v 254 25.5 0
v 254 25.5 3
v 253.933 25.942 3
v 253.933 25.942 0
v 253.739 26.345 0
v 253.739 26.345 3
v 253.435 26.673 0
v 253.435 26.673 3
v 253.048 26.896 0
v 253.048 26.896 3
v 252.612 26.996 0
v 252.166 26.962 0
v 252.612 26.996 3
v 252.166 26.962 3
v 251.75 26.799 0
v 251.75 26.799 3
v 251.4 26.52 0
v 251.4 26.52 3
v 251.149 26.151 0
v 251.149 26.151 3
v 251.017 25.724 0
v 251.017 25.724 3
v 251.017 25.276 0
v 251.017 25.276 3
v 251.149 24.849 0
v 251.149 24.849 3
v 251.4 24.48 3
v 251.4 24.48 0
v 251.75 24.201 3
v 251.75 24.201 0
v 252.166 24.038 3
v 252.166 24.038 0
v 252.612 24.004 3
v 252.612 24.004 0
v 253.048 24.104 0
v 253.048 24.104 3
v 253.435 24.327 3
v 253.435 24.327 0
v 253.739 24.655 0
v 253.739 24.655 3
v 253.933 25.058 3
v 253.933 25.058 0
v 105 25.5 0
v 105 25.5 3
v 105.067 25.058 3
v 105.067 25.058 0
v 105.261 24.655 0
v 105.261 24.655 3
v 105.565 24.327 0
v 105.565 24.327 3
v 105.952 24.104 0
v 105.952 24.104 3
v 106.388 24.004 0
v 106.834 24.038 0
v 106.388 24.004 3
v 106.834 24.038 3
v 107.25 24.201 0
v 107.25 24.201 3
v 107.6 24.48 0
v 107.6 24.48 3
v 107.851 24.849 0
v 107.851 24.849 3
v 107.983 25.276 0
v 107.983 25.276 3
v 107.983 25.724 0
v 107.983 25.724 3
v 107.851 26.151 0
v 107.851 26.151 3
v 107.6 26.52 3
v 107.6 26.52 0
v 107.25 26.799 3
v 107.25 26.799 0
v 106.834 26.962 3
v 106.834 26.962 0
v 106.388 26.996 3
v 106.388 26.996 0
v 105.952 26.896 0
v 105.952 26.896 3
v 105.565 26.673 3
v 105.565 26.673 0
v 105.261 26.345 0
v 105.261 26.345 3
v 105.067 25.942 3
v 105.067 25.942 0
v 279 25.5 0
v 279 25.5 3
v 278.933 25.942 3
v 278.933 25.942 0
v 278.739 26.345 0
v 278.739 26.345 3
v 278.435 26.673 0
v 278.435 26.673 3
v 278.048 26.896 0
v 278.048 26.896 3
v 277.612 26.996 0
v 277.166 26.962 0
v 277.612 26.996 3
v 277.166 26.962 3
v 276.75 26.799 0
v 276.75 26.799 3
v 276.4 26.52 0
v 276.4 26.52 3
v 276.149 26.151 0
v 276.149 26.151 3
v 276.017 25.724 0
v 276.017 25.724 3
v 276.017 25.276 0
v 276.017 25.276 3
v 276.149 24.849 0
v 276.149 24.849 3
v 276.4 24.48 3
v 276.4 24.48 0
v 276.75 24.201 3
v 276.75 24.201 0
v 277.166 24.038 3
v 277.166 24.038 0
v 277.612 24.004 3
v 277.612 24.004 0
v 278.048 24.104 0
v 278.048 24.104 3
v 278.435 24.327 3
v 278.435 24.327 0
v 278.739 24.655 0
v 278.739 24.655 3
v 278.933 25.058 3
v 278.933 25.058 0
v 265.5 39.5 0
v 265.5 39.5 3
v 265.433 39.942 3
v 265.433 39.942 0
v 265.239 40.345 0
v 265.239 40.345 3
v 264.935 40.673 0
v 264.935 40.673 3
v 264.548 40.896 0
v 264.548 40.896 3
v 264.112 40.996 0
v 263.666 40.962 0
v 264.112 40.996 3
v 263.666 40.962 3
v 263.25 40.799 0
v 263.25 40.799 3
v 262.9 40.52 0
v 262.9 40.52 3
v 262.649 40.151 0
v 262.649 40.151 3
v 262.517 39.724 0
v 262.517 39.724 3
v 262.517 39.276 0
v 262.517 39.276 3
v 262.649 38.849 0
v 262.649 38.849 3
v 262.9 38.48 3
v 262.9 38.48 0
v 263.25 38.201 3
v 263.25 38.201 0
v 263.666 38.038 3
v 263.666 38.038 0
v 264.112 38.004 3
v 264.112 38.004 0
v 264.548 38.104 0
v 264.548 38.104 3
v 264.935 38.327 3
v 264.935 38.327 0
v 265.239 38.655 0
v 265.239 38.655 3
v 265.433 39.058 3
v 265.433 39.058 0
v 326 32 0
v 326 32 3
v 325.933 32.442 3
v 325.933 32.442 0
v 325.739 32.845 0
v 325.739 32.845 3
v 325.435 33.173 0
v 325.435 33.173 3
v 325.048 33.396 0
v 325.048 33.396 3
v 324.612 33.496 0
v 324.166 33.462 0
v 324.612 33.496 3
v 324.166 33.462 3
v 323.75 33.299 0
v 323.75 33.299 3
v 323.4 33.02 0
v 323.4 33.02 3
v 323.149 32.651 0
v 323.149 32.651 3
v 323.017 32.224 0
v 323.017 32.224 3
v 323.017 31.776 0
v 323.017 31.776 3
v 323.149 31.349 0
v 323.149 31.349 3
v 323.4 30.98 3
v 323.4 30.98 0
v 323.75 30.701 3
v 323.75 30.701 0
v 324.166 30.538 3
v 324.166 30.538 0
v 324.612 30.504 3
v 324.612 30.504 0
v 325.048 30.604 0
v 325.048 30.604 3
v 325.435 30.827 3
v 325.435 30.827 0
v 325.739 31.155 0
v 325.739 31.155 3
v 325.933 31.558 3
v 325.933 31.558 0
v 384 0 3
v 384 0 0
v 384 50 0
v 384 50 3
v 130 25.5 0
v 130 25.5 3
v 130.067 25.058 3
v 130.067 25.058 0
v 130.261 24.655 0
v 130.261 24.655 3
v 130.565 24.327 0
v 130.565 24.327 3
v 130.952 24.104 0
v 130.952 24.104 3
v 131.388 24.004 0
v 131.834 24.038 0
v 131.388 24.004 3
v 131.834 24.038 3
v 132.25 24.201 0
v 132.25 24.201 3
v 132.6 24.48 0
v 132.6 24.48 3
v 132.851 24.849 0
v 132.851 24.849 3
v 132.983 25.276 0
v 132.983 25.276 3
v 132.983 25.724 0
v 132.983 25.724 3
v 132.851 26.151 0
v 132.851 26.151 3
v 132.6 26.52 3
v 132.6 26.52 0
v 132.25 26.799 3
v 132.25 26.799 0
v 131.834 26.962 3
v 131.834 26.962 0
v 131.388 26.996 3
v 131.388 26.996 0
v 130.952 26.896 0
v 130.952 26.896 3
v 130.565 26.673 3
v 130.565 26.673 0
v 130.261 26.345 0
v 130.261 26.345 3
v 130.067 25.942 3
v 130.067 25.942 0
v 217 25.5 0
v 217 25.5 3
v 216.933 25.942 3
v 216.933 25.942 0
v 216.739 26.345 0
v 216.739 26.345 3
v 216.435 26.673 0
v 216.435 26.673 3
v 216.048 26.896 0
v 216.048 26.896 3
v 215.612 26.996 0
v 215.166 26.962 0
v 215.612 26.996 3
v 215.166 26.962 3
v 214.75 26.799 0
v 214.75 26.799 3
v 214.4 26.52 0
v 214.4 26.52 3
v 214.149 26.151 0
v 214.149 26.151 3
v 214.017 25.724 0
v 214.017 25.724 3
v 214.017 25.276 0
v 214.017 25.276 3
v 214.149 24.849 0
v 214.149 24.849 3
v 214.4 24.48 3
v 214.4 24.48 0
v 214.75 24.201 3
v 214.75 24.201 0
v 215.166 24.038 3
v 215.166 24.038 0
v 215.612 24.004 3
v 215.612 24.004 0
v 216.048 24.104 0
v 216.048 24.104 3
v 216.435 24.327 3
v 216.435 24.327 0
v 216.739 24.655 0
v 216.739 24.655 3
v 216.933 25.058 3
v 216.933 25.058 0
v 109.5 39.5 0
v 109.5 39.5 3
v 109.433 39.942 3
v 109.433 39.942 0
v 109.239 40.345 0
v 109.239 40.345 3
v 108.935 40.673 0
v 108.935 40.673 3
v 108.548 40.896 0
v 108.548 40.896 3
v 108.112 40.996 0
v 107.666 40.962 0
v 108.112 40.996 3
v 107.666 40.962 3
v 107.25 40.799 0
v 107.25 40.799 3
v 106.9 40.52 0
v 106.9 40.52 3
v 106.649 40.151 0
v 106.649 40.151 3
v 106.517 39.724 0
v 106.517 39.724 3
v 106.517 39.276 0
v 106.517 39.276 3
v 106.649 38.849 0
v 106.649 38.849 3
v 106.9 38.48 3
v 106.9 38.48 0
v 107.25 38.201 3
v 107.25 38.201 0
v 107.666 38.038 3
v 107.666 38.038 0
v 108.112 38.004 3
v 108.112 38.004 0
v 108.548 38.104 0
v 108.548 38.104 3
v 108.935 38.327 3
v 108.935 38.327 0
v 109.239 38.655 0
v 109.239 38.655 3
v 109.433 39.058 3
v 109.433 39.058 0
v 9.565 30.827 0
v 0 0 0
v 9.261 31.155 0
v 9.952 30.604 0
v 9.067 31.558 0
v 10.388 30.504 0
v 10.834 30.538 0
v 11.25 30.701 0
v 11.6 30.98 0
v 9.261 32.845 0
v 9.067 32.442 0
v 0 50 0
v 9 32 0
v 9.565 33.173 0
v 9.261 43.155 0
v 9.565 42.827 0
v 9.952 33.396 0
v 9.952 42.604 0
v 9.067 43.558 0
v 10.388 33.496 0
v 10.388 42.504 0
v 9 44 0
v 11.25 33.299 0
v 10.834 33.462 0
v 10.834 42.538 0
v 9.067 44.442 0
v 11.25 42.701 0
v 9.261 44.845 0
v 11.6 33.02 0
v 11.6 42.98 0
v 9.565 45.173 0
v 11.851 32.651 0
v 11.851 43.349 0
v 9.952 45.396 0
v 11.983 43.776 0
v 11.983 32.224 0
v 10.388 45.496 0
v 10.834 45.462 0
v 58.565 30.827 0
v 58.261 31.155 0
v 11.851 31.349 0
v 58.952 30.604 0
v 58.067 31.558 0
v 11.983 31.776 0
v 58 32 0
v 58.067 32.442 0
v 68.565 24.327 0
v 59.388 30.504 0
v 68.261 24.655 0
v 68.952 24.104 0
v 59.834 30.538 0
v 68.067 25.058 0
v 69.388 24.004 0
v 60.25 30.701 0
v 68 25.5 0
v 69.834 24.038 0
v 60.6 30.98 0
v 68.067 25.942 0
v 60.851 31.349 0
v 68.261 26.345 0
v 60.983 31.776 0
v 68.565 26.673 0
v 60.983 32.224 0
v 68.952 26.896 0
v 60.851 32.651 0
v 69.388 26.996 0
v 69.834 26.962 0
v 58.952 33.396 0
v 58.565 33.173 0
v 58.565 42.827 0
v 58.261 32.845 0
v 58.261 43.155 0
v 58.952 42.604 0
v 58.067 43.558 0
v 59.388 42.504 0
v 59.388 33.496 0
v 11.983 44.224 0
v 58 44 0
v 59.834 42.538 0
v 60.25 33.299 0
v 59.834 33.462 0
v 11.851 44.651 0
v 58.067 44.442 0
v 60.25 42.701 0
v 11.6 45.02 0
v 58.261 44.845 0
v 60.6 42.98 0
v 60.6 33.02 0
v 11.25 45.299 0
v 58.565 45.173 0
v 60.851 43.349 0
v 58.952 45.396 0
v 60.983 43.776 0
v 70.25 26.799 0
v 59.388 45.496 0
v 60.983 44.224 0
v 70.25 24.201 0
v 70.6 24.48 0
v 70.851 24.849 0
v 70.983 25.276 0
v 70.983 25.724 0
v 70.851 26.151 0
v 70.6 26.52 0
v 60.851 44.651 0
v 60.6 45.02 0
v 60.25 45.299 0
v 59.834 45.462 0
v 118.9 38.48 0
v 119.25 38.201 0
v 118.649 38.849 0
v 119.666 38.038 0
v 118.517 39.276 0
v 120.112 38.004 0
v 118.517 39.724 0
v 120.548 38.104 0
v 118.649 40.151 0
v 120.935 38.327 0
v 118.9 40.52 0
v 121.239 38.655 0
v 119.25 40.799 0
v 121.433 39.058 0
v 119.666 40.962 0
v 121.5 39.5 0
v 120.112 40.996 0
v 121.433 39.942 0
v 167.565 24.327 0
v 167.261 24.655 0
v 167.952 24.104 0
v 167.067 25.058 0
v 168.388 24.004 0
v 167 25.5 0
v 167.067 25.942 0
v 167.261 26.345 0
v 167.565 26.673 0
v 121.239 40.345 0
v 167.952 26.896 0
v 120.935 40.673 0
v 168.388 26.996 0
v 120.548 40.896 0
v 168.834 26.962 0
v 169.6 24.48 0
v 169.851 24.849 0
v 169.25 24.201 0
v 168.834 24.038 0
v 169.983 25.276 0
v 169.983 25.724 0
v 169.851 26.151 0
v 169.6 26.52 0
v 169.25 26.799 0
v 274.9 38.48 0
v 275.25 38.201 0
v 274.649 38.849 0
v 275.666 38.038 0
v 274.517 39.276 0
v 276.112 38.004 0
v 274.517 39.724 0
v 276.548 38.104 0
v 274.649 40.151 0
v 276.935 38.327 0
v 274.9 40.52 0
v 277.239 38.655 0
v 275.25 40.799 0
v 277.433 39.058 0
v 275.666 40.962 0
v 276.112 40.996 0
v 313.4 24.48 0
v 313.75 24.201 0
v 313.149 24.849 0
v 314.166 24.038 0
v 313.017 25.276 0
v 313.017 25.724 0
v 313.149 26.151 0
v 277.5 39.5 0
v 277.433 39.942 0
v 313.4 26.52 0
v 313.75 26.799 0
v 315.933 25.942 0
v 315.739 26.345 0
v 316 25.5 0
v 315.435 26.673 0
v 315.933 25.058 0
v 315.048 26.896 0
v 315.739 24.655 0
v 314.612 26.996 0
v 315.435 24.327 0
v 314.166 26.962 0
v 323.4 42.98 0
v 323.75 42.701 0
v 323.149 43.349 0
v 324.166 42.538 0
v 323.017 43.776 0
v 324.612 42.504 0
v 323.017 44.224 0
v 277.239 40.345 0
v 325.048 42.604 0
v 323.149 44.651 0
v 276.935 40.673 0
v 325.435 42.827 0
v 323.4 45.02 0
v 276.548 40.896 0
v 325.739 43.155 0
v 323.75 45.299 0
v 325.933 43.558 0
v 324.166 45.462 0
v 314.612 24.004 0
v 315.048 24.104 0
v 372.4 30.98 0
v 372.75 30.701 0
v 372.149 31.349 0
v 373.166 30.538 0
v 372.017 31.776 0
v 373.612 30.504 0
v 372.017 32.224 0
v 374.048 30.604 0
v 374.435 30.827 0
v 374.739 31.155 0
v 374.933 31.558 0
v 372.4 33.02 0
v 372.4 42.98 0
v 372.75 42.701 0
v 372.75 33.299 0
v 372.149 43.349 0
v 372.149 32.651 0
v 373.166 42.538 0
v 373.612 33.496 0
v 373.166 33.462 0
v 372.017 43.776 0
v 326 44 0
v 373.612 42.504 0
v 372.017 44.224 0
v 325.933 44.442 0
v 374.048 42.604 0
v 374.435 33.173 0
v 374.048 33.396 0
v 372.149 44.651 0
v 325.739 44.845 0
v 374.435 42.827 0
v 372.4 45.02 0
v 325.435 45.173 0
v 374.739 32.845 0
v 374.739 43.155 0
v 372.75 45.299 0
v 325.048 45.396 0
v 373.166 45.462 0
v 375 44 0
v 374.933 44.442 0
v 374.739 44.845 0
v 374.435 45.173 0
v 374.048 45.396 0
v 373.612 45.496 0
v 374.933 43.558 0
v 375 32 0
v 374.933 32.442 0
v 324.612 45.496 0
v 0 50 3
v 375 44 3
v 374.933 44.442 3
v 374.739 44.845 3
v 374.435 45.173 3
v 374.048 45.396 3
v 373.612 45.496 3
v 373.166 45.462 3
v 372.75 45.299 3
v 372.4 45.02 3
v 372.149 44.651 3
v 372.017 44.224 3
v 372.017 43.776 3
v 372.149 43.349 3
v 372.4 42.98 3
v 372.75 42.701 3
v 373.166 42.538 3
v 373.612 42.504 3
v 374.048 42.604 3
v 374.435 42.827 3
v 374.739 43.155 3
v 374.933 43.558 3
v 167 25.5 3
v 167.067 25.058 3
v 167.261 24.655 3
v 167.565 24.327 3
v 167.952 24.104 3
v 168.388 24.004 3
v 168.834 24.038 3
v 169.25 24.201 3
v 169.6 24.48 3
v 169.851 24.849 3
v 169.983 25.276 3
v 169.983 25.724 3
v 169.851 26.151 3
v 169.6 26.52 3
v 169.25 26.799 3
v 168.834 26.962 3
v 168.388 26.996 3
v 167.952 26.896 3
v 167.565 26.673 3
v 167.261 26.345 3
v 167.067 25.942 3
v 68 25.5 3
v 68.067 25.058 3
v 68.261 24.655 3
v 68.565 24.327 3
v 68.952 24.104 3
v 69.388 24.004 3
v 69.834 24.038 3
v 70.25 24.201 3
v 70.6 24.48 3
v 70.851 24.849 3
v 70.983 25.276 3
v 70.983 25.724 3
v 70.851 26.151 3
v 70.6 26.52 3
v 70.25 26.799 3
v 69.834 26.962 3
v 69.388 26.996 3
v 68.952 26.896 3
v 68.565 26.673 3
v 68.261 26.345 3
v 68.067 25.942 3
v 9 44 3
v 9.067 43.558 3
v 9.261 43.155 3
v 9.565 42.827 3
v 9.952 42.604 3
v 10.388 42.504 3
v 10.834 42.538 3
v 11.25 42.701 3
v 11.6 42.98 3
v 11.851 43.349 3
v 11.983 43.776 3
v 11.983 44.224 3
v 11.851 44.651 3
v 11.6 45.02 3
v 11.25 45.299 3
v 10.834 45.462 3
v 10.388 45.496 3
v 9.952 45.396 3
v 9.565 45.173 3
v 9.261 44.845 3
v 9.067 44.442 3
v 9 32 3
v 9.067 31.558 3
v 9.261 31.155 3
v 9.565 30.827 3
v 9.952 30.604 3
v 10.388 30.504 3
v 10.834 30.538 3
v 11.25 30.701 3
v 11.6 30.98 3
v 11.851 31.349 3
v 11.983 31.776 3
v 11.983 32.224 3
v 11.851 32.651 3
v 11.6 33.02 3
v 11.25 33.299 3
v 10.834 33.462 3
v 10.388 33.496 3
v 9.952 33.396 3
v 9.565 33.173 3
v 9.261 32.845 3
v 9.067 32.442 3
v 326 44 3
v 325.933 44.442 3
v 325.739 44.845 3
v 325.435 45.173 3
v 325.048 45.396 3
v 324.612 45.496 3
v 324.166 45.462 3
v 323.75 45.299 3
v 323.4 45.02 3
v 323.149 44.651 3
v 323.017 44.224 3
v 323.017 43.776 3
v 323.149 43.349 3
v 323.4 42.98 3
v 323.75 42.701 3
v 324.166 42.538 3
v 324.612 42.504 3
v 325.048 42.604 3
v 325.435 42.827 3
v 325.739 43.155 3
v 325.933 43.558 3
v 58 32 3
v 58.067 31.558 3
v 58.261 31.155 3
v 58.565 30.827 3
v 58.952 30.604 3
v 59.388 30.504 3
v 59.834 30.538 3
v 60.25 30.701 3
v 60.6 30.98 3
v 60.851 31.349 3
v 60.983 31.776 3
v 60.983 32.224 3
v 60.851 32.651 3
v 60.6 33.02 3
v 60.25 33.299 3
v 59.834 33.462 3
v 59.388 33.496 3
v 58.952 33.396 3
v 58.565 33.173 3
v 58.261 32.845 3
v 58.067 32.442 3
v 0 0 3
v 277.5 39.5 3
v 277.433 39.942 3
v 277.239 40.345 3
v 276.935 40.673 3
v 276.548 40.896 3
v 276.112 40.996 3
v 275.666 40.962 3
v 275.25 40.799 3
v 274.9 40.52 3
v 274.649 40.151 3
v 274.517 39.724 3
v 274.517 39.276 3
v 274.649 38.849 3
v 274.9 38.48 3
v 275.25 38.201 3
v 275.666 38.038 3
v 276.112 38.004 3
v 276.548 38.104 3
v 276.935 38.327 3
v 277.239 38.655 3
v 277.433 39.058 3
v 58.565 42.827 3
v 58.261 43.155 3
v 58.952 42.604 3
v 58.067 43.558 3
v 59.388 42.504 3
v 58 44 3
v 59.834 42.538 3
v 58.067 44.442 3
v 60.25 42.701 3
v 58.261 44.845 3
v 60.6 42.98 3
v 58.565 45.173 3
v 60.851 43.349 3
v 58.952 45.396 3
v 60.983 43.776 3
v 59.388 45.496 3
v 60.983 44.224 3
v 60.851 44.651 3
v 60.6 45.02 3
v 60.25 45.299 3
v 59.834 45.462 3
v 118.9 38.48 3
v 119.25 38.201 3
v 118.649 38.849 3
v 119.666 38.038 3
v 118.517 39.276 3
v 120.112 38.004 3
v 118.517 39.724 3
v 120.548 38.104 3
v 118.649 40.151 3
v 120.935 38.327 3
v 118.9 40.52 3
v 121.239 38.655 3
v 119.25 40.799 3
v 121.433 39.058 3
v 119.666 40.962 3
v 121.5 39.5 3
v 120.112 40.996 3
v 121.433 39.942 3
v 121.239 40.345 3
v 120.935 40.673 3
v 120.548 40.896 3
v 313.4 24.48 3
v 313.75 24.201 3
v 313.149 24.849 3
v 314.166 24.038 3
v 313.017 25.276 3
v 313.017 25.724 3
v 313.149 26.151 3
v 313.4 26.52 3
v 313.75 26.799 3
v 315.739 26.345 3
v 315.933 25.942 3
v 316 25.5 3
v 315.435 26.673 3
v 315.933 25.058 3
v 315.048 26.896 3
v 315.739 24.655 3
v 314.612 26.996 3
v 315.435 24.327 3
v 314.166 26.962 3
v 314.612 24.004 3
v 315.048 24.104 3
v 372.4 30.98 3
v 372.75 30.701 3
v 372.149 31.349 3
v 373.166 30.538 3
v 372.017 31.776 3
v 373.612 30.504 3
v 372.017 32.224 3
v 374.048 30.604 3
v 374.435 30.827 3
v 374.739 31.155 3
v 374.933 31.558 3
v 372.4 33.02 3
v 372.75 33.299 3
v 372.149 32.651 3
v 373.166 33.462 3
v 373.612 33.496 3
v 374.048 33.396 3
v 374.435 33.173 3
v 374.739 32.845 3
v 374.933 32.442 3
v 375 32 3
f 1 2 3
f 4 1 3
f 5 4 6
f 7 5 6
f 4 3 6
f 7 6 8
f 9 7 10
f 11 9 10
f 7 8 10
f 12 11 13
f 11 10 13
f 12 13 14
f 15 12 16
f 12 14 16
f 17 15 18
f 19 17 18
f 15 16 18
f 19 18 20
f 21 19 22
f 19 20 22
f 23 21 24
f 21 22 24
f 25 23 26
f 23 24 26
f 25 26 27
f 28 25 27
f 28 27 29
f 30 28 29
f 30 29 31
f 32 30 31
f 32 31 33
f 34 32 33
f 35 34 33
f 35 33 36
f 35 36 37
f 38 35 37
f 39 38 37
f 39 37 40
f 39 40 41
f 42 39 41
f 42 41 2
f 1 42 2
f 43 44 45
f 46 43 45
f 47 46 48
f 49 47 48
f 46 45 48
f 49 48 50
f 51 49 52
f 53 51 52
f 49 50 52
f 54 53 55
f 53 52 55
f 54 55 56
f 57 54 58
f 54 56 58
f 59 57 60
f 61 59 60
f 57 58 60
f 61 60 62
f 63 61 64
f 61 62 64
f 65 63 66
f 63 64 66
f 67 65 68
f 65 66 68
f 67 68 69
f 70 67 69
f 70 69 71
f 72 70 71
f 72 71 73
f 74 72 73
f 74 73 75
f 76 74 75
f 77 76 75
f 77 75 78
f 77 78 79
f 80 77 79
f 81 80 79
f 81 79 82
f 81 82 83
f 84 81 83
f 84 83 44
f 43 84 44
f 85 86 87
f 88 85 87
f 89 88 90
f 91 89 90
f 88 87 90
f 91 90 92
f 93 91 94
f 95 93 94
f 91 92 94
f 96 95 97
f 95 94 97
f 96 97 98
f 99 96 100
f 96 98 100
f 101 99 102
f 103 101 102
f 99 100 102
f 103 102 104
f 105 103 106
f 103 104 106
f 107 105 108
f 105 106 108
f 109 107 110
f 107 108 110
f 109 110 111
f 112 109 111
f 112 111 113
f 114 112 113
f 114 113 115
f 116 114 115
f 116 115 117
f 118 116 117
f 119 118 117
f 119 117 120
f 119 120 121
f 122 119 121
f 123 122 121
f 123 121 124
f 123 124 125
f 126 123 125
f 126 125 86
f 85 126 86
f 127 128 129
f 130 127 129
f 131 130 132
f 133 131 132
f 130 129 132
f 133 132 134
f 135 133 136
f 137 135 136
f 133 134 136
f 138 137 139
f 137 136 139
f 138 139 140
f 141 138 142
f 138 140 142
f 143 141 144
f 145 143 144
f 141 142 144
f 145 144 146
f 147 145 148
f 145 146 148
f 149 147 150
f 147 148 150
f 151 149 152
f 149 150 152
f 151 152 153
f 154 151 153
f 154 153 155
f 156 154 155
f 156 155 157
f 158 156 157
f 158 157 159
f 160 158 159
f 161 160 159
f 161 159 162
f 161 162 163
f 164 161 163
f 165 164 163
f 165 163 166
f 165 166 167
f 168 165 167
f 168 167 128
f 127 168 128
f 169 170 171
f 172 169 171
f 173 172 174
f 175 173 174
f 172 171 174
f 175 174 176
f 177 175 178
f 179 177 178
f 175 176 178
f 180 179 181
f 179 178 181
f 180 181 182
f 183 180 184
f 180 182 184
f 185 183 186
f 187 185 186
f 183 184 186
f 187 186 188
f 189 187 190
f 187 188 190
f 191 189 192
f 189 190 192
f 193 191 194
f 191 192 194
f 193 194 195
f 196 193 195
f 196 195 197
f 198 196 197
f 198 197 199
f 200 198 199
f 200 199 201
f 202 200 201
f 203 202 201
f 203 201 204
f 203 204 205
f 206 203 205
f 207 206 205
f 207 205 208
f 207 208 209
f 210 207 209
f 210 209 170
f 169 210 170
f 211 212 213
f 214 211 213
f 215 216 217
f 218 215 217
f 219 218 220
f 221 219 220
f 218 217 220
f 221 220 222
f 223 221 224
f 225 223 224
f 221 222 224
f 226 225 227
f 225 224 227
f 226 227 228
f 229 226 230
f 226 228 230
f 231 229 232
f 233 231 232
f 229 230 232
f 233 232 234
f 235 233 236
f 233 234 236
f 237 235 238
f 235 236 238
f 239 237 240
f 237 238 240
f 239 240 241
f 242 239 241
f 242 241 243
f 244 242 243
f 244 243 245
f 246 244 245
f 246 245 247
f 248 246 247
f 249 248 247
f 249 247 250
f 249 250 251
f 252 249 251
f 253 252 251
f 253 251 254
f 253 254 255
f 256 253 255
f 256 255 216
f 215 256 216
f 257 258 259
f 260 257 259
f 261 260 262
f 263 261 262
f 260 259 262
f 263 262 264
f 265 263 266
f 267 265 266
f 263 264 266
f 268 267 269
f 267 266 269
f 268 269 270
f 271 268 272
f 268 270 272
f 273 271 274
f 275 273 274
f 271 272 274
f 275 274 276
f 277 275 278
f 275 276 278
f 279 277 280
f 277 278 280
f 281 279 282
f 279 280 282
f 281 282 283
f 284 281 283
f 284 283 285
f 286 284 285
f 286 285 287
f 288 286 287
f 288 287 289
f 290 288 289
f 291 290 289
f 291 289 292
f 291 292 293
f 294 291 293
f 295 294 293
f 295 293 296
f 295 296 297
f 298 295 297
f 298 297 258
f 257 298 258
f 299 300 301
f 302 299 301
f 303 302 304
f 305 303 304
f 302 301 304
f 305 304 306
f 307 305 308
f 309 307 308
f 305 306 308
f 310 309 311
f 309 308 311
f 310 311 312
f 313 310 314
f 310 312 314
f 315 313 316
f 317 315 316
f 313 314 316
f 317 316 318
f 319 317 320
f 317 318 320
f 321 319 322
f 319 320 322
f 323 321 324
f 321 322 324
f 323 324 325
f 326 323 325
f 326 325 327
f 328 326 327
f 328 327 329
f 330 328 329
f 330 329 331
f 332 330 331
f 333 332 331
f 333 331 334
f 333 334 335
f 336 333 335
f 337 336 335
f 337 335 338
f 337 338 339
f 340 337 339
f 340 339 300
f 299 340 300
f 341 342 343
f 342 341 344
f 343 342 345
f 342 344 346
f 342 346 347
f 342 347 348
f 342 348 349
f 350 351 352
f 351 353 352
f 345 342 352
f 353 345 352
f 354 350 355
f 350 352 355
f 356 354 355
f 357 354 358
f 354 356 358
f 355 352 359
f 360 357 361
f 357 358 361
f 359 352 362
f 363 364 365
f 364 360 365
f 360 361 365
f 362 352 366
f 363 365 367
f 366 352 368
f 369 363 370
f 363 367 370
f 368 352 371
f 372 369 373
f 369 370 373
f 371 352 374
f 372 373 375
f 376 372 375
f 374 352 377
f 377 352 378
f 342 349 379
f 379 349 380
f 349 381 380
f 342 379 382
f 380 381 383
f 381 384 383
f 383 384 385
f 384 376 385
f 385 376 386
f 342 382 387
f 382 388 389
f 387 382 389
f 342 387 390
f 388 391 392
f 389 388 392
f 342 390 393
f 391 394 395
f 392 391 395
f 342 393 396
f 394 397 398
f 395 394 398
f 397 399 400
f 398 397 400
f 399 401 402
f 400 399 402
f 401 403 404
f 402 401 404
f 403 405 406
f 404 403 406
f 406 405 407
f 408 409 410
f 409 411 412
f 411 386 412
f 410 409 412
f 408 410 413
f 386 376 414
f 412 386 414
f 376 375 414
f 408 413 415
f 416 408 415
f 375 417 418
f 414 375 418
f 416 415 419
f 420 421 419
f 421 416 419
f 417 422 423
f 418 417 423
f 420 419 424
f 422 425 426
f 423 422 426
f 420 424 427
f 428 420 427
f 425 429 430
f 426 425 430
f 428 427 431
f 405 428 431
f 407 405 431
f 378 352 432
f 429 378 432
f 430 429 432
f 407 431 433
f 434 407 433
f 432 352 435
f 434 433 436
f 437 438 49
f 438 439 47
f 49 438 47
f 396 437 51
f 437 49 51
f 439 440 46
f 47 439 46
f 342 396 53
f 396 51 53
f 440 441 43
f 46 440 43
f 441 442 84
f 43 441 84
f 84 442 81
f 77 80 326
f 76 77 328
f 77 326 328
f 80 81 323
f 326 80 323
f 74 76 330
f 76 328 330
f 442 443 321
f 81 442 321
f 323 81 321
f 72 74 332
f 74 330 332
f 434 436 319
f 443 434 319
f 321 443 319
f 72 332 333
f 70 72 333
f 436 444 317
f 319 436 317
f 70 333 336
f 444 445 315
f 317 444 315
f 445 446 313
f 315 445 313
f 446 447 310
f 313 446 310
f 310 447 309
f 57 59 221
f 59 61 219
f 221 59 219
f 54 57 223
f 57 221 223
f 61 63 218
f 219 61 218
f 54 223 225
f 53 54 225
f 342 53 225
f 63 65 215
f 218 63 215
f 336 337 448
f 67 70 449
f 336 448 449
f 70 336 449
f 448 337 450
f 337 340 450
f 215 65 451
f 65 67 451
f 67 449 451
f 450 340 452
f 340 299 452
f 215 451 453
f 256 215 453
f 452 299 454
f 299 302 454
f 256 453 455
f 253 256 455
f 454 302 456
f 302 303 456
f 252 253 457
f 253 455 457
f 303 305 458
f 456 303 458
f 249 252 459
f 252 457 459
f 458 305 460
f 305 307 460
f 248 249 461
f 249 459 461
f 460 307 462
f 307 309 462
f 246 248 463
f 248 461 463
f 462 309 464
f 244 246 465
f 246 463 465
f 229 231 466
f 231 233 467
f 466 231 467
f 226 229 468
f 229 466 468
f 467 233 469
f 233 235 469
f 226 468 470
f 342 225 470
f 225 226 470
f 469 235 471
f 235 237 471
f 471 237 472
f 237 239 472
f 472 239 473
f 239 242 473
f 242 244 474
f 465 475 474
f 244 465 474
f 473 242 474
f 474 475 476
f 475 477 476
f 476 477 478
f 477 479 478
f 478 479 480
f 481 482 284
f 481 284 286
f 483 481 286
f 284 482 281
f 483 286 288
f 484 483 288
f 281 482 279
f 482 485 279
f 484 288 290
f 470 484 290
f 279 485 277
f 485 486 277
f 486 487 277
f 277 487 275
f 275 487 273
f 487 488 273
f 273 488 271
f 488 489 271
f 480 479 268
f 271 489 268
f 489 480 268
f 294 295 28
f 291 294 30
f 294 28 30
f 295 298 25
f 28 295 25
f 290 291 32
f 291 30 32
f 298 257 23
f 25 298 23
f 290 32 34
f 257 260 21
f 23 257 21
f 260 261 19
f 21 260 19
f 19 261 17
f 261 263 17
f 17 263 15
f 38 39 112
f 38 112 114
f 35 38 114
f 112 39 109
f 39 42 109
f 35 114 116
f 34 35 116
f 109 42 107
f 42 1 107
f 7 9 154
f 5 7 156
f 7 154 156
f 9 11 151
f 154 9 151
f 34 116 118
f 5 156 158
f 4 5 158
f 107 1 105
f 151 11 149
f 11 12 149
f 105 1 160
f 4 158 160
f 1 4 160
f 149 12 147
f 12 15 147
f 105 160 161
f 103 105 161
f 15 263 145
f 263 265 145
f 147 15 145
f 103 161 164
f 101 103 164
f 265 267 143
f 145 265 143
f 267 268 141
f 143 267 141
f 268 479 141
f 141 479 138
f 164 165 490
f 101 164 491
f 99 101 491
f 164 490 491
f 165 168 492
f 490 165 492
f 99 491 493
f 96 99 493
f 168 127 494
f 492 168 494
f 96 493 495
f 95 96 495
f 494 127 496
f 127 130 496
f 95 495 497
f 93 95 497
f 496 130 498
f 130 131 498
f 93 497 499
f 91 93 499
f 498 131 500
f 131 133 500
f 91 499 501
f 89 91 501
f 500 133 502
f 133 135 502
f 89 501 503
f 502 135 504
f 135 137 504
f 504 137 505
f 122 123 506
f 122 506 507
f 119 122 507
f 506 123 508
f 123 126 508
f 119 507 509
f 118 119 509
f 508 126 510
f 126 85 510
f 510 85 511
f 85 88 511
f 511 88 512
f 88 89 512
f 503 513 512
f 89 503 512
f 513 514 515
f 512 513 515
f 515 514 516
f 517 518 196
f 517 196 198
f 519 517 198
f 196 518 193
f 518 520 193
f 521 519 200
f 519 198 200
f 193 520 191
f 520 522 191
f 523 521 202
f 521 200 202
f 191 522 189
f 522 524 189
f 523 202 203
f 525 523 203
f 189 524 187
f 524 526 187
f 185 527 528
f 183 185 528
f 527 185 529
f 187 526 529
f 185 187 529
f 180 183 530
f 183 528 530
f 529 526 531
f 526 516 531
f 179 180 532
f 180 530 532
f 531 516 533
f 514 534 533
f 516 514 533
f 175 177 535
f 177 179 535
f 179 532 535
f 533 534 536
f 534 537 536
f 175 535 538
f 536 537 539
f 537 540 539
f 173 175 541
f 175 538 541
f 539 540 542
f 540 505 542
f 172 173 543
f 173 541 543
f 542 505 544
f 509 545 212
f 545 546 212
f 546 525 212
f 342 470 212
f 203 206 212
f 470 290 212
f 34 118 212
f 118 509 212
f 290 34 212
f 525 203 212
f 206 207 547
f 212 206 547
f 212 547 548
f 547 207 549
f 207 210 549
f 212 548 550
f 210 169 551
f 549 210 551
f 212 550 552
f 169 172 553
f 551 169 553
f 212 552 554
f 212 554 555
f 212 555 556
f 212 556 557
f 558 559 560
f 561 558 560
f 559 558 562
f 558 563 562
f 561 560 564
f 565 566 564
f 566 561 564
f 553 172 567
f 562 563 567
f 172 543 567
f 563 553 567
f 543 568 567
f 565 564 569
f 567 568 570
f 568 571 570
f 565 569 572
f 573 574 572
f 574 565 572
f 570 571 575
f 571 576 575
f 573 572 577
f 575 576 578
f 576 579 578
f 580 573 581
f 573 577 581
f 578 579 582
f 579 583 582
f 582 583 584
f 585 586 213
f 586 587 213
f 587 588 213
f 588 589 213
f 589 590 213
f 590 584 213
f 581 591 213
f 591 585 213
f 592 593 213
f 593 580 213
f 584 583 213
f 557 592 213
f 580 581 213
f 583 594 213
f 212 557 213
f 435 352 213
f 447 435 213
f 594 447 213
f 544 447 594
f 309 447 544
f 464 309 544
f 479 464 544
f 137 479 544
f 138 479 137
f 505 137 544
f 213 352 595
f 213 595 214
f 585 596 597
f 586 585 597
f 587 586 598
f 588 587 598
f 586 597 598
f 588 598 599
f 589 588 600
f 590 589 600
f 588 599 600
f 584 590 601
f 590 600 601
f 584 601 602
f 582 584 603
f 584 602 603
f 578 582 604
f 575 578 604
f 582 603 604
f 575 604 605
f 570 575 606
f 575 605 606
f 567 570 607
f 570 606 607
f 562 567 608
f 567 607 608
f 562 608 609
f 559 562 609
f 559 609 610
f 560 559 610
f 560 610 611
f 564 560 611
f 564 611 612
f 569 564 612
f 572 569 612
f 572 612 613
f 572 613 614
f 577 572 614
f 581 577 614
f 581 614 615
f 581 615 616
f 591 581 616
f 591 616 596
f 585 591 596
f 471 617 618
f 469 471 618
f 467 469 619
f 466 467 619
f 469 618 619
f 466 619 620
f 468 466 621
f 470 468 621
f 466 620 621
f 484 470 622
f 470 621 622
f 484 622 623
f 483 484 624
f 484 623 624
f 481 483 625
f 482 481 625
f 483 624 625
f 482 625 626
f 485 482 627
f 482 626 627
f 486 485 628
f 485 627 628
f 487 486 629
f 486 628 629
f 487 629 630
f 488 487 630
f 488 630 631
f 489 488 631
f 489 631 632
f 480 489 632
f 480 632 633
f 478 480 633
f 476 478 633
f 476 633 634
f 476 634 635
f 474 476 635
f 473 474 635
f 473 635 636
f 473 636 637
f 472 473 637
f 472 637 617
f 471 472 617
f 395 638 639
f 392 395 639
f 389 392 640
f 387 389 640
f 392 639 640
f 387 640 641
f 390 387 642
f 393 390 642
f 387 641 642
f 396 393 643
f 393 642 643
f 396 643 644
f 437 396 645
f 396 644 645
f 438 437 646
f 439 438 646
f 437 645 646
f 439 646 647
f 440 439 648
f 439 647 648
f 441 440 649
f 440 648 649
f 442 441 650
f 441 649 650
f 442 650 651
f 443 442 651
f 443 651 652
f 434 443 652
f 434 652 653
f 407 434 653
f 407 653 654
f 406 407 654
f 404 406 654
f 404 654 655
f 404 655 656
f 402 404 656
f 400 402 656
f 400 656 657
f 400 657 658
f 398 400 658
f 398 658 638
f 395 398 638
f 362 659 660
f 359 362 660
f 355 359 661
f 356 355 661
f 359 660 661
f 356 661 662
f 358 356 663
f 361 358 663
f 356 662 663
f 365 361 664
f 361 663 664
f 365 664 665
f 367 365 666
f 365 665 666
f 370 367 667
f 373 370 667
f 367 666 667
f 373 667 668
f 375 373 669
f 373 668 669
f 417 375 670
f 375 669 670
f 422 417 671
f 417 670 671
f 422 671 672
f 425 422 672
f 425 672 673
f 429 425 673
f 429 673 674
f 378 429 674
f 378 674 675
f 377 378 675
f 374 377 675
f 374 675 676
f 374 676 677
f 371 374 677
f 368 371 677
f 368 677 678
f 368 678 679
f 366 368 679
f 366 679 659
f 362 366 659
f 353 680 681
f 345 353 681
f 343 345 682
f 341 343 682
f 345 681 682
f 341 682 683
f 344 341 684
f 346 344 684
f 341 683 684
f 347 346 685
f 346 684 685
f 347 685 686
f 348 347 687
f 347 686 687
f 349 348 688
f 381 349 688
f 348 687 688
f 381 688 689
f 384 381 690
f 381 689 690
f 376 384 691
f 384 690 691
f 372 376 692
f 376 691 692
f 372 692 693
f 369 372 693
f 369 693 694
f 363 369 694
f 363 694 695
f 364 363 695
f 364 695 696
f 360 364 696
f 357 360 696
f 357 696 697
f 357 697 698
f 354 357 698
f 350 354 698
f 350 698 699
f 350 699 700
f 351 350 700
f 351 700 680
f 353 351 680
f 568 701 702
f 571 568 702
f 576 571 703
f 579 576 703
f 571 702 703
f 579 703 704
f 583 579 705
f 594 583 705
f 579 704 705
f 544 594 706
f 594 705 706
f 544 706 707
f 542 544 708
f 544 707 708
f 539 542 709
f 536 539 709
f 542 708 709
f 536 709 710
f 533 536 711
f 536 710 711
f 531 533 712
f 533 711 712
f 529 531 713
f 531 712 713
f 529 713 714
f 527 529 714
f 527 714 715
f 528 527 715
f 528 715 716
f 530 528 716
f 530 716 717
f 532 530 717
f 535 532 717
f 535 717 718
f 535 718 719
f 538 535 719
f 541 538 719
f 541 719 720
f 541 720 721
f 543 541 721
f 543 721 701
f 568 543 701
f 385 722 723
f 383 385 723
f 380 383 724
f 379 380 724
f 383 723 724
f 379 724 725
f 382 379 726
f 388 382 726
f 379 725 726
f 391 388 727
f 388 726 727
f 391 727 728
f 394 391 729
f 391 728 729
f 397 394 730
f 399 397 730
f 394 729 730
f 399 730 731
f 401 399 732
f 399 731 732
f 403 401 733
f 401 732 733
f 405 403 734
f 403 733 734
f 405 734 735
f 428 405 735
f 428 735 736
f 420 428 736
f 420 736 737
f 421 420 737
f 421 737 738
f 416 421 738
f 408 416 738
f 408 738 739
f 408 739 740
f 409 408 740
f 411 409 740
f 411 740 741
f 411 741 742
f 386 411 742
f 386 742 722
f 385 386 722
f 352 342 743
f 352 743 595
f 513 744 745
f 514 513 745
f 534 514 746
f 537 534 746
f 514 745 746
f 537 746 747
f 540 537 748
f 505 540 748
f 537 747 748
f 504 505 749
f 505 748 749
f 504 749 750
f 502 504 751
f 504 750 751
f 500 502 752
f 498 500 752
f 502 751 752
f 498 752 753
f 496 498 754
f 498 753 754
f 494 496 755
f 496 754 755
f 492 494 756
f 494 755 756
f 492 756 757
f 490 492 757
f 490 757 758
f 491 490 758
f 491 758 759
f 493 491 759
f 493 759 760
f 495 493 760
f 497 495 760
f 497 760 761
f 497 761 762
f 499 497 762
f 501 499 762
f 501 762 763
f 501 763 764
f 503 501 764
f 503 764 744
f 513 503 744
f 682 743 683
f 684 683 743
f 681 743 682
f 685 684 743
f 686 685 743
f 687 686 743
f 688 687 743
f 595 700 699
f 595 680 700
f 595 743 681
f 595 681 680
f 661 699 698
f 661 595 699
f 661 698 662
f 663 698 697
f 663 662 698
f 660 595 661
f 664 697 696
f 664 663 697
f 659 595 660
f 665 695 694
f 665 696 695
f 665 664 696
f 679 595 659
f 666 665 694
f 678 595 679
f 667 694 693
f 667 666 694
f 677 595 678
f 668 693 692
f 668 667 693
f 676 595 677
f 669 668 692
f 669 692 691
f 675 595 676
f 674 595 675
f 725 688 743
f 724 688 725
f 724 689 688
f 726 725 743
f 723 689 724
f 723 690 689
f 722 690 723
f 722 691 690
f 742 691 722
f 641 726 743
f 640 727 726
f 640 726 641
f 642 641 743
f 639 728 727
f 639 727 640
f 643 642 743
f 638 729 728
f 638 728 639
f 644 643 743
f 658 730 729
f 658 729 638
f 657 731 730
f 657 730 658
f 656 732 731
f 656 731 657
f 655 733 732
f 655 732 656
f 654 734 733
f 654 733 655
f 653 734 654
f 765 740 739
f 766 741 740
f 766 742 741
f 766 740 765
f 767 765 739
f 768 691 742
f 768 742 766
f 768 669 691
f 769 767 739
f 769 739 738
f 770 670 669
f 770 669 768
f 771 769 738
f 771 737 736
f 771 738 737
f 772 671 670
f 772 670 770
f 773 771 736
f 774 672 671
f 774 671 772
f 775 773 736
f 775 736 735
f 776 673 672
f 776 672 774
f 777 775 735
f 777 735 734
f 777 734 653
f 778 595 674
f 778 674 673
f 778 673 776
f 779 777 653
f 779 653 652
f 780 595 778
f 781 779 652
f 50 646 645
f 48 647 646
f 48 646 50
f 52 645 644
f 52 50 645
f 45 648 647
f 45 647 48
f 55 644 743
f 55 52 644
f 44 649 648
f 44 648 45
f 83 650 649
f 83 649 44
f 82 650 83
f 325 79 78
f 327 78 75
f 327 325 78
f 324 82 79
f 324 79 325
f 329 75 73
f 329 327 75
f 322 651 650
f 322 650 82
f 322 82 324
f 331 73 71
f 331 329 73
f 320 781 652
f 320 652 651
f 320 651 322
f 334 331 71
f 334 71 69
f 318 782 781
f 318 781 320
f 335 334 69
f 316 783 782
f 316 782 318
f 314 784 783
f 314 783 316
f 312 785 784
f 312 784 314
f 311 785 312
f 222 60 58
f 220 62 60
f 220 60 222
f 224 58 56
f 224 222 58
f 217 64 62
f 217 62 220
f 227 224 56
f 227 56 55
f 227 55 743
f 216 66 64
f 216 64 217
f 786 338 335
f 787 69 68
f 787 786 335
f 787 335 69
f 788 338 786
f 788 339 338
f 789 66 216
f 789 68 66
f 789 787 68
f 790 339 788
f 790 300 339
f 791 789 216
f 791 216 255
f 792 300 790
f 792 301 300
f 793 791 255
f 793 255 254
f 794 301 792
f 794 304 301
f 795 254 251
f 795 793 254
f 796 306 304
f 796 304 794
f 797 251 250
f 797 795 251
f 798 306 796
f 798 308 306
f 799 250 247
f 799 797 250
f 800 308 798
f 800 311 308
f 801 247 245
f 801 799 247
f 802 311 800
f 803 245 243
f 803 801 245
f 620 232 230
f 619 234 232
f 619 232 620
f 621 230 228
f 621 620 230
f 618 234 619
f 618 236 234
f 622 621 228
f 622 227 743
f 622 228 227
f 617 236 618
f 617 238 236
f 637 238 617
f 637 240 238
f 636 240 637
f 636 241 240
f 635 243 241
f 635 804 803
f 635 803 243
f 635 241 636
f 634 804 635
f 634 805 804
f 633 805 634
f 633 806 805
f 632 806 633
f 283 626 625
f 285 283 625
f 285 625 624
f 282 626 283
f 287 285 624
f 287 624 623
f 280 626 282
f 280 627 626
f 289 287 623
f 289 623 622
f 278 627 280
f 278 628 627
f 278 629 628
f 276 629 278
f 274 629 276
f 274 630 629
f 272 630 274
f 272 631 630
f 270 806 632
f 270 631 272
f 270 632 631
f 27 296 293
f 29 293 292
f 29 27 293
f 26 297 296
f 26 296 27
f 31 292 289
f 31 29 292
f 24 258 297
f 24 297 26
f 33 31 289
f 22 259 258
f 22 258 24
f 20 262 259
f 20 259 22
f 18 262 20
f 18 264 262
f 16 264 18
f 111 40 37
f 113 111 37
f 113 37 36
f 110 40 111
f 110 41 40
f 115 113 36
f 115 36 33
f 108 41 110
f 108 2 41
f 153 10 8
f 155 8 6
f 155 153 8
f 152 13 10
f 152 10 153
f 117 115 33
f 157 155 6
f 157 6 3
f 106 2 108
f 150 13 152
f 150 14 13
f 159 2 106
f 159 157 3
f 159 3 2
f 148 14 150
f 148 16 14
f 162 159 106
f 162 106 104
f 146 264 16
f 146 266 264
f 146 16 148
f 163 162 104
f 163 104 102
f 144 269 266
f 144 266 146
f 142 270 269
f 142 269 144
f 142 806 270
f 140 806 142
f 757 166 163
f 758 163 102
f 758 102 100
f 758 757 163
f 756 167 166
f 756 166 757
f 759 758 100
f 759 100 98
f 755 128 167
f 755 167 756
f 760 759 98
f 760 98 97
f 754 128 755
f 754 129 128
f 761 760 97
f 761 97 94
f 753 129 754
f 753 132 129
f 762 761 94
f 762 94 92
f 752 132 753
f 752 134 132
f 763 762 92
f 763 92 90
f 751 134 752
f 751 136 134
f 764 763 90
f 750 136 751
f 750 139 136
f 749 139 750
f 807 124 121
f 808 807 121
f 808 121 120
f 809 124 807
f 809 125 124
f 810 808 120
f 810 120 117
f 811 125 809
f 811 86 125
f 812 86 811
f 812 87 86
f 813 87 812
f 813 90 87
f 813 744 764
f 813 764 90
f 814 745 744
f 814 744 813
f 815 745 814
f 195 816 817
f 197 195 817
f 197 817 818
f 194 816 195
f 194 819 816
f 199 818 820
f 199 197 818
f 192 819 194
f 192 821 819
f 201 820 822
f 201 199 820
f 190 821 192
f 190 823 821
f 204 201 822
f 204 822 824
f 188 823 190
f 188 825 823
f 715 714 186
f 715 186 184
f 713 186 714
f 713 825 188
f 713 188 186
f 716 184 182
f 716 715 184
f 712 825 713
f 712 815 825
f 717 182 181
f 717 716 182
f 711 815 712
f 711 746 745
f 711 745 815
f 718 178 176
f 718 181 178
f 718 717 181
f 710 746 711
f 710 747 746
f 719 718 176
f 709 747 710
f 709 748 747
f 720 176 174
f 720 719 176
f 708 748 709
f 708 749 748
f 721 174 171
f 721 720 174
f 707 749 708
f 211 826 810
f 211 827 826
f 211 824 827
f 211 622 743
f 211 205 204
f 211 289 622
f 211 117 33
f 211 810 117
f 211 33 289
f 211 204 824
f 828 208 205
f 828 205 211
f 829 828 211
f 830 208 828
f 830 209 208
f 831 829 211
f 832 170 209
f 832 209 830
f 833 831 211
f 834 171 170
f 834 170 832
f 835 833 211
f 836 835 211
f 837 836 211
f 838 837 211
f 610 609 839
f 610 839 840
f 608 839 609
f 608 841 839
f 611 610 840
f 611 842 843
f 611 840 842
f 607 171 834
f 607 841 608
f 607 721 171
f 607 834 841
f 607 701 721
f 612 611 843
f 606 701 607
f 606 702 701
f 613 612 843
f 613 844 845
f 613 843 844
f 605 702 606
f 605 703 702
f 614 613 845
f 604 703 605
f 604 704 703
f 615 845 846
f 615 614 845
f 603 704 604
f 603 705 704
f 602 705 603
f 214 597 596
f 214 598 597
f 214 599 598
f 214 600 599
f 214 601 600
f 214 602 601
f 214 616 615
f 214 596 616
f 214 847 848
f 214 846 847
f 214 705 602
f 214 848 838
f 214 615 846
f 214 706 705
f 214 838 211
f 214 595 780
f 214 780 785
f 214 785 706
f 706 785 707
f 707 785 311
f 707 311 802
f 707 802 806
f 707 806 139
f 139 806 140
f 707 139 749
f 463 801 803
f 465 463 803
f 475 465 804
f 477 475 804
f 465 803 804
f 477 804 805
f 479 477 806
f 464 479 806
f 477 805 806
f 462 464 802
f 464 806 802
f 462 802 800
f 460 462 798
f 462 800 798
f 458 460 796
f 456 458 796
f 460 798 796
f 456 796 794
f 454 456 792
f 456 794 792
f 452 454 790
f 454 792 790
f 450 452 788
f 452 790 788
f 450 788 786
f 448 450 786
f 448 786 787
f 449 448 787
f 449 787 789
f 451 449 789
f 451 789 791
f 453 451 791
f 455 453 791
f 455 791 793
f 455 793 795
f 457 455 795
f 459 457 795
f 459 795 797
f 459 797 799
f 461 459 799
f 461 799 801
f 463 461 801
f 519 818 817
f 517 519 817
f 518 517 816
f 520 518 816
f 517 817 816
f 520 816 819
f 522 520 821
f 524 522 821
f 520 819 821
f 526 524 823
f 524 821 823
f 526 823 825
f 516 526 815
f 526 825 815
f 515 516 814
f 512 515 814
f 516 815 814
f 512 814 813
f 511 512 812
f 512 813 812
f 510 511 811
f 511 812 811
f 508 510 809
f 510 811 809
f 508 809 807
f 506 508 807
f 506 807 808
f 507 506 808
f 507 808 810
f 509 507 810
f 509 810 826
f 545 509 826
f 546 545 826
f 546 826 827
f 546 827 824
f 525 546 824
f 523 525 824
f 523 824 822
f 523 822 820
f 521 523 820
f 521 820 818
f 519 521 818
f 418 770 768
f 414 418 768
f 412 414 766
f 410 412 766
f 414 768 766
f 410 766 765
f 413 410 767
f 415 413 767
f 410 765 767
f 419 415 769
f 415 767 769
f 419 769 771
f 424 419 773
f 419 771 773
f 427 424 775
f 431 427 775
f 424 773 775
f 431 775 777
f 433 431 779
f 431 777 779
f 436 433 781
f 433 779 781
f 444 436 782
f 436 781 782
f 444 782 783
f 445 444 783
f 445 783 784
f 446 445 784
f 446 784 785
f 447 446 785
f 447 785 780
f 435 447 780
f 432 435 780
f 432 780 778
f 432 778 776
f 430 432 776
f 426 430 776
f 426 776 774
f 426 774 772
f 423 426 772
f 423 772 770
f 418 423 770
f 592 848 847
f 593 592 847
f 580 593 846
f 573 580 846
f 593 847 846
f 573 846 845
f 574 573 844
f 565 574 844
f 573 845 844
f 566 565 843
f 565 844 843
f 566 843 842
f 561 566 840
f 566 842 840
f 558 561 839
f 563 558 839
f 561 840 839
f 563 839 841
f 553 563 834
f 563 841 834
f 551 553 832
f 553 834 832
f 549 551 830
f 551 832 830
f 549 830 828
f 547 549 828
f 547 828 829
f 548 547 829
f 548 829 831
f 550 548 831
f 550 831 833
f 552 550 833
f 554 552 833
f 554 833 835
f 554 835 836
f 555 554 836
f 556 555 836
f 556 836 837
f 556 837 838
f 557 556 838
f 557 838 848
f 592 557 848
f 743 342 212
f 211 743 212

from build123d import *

# Parameters (mm, degrees)
SKETCH_1_W          = 384
SKETCH_1_H          = 50
EXTRUDE_1_DEPTH     = 3
SKETCH_2_R          = 1.5
CUT_EXTRUDE_1_DEPTH = 388.253147179


with BuildPart() as part:
    # 草图1 → 凸台-拉伸1 (new body)
    with BuildSketch(Plane.XY):
        with Locations((192, 25)):
            Rectangle(SKETCH_1_W, SKETCH_1_H)
    extrude(amount=EXTRUDE_1_DEPTH)

    # 草图2 → 切除-拉伸1 (cut, through all)
    with BuildSketch(Plane.XY.offset(3)):
        with Locations((264, 39.5)):
            Circle(SKETCH_2_R)
        with Locations((276, 39.5)):
            Circle(SKETCH_2_R)
        with Locations((120, 39.5)):
            Circle(SKETCH_2_R)
        with Locations((108, 39.5)):
            Circle(SKETCH_2_R)
        with Locations((215.5, 25.5)):
            Circle(SKETCH_2_R)
        with Locations((252.5, 25.5)):
            Circle(SKETCH_2_R)
        with Locations((277.5, 25.5)):
            Circle(SKETCH_2_R)
        with Locations((314.5, 25.5)):
            Circle(SKETCH_2_R)
        with Locations(Location((69.5, 25.5, 0), (0, 0, 180))):
            Circle(SKETCH_2_R)
        with Locations(Location((106.5, 25.5, 0), (0, 0, 180))):
            Circle(SKETCH_2_R)
        with Locations(Location((131.5, 25.5, 0), (0, 0, 180))):
            Circle(SKETCH_2_R)
        with Locations(Location((168.5, 25.5, 0), (0, 0, 180))):
            Circle(SKETCH_2_R)
        with Locations((373.5, 44)):
            Circle(SKETCH_2_R)
        with Locations((373.5, 32)):
            Circle(SKETCH_2_R)
        with Locations((324.5, 44)):
            Circle(SKETCH_2_R)
        with Locations((324.5, 32)):
            Circle(SKETCH_2_R)
        with Locations(Location((59.5, 44, 0), (0, 0, 180))):
            Circle(SKETCH_2_R)
        with Locations(Location((10.5, 44, 0), (0, 0, 180))):
            Circle(SKETCH_2_R)
        with Locations(Location((10.5, 32, 0), (0, 0, 180))):
            Circle(SKETCH_2_R)
        with Locations(Location((59.5, 32, 0), (0, 0, 180))):
            Circle(SKETCH_2_R)
    extrude(amount=-CUT_EXTRUDE_1_DEPTH, mode=Mode.SUBTRACT)


solid = part.part
